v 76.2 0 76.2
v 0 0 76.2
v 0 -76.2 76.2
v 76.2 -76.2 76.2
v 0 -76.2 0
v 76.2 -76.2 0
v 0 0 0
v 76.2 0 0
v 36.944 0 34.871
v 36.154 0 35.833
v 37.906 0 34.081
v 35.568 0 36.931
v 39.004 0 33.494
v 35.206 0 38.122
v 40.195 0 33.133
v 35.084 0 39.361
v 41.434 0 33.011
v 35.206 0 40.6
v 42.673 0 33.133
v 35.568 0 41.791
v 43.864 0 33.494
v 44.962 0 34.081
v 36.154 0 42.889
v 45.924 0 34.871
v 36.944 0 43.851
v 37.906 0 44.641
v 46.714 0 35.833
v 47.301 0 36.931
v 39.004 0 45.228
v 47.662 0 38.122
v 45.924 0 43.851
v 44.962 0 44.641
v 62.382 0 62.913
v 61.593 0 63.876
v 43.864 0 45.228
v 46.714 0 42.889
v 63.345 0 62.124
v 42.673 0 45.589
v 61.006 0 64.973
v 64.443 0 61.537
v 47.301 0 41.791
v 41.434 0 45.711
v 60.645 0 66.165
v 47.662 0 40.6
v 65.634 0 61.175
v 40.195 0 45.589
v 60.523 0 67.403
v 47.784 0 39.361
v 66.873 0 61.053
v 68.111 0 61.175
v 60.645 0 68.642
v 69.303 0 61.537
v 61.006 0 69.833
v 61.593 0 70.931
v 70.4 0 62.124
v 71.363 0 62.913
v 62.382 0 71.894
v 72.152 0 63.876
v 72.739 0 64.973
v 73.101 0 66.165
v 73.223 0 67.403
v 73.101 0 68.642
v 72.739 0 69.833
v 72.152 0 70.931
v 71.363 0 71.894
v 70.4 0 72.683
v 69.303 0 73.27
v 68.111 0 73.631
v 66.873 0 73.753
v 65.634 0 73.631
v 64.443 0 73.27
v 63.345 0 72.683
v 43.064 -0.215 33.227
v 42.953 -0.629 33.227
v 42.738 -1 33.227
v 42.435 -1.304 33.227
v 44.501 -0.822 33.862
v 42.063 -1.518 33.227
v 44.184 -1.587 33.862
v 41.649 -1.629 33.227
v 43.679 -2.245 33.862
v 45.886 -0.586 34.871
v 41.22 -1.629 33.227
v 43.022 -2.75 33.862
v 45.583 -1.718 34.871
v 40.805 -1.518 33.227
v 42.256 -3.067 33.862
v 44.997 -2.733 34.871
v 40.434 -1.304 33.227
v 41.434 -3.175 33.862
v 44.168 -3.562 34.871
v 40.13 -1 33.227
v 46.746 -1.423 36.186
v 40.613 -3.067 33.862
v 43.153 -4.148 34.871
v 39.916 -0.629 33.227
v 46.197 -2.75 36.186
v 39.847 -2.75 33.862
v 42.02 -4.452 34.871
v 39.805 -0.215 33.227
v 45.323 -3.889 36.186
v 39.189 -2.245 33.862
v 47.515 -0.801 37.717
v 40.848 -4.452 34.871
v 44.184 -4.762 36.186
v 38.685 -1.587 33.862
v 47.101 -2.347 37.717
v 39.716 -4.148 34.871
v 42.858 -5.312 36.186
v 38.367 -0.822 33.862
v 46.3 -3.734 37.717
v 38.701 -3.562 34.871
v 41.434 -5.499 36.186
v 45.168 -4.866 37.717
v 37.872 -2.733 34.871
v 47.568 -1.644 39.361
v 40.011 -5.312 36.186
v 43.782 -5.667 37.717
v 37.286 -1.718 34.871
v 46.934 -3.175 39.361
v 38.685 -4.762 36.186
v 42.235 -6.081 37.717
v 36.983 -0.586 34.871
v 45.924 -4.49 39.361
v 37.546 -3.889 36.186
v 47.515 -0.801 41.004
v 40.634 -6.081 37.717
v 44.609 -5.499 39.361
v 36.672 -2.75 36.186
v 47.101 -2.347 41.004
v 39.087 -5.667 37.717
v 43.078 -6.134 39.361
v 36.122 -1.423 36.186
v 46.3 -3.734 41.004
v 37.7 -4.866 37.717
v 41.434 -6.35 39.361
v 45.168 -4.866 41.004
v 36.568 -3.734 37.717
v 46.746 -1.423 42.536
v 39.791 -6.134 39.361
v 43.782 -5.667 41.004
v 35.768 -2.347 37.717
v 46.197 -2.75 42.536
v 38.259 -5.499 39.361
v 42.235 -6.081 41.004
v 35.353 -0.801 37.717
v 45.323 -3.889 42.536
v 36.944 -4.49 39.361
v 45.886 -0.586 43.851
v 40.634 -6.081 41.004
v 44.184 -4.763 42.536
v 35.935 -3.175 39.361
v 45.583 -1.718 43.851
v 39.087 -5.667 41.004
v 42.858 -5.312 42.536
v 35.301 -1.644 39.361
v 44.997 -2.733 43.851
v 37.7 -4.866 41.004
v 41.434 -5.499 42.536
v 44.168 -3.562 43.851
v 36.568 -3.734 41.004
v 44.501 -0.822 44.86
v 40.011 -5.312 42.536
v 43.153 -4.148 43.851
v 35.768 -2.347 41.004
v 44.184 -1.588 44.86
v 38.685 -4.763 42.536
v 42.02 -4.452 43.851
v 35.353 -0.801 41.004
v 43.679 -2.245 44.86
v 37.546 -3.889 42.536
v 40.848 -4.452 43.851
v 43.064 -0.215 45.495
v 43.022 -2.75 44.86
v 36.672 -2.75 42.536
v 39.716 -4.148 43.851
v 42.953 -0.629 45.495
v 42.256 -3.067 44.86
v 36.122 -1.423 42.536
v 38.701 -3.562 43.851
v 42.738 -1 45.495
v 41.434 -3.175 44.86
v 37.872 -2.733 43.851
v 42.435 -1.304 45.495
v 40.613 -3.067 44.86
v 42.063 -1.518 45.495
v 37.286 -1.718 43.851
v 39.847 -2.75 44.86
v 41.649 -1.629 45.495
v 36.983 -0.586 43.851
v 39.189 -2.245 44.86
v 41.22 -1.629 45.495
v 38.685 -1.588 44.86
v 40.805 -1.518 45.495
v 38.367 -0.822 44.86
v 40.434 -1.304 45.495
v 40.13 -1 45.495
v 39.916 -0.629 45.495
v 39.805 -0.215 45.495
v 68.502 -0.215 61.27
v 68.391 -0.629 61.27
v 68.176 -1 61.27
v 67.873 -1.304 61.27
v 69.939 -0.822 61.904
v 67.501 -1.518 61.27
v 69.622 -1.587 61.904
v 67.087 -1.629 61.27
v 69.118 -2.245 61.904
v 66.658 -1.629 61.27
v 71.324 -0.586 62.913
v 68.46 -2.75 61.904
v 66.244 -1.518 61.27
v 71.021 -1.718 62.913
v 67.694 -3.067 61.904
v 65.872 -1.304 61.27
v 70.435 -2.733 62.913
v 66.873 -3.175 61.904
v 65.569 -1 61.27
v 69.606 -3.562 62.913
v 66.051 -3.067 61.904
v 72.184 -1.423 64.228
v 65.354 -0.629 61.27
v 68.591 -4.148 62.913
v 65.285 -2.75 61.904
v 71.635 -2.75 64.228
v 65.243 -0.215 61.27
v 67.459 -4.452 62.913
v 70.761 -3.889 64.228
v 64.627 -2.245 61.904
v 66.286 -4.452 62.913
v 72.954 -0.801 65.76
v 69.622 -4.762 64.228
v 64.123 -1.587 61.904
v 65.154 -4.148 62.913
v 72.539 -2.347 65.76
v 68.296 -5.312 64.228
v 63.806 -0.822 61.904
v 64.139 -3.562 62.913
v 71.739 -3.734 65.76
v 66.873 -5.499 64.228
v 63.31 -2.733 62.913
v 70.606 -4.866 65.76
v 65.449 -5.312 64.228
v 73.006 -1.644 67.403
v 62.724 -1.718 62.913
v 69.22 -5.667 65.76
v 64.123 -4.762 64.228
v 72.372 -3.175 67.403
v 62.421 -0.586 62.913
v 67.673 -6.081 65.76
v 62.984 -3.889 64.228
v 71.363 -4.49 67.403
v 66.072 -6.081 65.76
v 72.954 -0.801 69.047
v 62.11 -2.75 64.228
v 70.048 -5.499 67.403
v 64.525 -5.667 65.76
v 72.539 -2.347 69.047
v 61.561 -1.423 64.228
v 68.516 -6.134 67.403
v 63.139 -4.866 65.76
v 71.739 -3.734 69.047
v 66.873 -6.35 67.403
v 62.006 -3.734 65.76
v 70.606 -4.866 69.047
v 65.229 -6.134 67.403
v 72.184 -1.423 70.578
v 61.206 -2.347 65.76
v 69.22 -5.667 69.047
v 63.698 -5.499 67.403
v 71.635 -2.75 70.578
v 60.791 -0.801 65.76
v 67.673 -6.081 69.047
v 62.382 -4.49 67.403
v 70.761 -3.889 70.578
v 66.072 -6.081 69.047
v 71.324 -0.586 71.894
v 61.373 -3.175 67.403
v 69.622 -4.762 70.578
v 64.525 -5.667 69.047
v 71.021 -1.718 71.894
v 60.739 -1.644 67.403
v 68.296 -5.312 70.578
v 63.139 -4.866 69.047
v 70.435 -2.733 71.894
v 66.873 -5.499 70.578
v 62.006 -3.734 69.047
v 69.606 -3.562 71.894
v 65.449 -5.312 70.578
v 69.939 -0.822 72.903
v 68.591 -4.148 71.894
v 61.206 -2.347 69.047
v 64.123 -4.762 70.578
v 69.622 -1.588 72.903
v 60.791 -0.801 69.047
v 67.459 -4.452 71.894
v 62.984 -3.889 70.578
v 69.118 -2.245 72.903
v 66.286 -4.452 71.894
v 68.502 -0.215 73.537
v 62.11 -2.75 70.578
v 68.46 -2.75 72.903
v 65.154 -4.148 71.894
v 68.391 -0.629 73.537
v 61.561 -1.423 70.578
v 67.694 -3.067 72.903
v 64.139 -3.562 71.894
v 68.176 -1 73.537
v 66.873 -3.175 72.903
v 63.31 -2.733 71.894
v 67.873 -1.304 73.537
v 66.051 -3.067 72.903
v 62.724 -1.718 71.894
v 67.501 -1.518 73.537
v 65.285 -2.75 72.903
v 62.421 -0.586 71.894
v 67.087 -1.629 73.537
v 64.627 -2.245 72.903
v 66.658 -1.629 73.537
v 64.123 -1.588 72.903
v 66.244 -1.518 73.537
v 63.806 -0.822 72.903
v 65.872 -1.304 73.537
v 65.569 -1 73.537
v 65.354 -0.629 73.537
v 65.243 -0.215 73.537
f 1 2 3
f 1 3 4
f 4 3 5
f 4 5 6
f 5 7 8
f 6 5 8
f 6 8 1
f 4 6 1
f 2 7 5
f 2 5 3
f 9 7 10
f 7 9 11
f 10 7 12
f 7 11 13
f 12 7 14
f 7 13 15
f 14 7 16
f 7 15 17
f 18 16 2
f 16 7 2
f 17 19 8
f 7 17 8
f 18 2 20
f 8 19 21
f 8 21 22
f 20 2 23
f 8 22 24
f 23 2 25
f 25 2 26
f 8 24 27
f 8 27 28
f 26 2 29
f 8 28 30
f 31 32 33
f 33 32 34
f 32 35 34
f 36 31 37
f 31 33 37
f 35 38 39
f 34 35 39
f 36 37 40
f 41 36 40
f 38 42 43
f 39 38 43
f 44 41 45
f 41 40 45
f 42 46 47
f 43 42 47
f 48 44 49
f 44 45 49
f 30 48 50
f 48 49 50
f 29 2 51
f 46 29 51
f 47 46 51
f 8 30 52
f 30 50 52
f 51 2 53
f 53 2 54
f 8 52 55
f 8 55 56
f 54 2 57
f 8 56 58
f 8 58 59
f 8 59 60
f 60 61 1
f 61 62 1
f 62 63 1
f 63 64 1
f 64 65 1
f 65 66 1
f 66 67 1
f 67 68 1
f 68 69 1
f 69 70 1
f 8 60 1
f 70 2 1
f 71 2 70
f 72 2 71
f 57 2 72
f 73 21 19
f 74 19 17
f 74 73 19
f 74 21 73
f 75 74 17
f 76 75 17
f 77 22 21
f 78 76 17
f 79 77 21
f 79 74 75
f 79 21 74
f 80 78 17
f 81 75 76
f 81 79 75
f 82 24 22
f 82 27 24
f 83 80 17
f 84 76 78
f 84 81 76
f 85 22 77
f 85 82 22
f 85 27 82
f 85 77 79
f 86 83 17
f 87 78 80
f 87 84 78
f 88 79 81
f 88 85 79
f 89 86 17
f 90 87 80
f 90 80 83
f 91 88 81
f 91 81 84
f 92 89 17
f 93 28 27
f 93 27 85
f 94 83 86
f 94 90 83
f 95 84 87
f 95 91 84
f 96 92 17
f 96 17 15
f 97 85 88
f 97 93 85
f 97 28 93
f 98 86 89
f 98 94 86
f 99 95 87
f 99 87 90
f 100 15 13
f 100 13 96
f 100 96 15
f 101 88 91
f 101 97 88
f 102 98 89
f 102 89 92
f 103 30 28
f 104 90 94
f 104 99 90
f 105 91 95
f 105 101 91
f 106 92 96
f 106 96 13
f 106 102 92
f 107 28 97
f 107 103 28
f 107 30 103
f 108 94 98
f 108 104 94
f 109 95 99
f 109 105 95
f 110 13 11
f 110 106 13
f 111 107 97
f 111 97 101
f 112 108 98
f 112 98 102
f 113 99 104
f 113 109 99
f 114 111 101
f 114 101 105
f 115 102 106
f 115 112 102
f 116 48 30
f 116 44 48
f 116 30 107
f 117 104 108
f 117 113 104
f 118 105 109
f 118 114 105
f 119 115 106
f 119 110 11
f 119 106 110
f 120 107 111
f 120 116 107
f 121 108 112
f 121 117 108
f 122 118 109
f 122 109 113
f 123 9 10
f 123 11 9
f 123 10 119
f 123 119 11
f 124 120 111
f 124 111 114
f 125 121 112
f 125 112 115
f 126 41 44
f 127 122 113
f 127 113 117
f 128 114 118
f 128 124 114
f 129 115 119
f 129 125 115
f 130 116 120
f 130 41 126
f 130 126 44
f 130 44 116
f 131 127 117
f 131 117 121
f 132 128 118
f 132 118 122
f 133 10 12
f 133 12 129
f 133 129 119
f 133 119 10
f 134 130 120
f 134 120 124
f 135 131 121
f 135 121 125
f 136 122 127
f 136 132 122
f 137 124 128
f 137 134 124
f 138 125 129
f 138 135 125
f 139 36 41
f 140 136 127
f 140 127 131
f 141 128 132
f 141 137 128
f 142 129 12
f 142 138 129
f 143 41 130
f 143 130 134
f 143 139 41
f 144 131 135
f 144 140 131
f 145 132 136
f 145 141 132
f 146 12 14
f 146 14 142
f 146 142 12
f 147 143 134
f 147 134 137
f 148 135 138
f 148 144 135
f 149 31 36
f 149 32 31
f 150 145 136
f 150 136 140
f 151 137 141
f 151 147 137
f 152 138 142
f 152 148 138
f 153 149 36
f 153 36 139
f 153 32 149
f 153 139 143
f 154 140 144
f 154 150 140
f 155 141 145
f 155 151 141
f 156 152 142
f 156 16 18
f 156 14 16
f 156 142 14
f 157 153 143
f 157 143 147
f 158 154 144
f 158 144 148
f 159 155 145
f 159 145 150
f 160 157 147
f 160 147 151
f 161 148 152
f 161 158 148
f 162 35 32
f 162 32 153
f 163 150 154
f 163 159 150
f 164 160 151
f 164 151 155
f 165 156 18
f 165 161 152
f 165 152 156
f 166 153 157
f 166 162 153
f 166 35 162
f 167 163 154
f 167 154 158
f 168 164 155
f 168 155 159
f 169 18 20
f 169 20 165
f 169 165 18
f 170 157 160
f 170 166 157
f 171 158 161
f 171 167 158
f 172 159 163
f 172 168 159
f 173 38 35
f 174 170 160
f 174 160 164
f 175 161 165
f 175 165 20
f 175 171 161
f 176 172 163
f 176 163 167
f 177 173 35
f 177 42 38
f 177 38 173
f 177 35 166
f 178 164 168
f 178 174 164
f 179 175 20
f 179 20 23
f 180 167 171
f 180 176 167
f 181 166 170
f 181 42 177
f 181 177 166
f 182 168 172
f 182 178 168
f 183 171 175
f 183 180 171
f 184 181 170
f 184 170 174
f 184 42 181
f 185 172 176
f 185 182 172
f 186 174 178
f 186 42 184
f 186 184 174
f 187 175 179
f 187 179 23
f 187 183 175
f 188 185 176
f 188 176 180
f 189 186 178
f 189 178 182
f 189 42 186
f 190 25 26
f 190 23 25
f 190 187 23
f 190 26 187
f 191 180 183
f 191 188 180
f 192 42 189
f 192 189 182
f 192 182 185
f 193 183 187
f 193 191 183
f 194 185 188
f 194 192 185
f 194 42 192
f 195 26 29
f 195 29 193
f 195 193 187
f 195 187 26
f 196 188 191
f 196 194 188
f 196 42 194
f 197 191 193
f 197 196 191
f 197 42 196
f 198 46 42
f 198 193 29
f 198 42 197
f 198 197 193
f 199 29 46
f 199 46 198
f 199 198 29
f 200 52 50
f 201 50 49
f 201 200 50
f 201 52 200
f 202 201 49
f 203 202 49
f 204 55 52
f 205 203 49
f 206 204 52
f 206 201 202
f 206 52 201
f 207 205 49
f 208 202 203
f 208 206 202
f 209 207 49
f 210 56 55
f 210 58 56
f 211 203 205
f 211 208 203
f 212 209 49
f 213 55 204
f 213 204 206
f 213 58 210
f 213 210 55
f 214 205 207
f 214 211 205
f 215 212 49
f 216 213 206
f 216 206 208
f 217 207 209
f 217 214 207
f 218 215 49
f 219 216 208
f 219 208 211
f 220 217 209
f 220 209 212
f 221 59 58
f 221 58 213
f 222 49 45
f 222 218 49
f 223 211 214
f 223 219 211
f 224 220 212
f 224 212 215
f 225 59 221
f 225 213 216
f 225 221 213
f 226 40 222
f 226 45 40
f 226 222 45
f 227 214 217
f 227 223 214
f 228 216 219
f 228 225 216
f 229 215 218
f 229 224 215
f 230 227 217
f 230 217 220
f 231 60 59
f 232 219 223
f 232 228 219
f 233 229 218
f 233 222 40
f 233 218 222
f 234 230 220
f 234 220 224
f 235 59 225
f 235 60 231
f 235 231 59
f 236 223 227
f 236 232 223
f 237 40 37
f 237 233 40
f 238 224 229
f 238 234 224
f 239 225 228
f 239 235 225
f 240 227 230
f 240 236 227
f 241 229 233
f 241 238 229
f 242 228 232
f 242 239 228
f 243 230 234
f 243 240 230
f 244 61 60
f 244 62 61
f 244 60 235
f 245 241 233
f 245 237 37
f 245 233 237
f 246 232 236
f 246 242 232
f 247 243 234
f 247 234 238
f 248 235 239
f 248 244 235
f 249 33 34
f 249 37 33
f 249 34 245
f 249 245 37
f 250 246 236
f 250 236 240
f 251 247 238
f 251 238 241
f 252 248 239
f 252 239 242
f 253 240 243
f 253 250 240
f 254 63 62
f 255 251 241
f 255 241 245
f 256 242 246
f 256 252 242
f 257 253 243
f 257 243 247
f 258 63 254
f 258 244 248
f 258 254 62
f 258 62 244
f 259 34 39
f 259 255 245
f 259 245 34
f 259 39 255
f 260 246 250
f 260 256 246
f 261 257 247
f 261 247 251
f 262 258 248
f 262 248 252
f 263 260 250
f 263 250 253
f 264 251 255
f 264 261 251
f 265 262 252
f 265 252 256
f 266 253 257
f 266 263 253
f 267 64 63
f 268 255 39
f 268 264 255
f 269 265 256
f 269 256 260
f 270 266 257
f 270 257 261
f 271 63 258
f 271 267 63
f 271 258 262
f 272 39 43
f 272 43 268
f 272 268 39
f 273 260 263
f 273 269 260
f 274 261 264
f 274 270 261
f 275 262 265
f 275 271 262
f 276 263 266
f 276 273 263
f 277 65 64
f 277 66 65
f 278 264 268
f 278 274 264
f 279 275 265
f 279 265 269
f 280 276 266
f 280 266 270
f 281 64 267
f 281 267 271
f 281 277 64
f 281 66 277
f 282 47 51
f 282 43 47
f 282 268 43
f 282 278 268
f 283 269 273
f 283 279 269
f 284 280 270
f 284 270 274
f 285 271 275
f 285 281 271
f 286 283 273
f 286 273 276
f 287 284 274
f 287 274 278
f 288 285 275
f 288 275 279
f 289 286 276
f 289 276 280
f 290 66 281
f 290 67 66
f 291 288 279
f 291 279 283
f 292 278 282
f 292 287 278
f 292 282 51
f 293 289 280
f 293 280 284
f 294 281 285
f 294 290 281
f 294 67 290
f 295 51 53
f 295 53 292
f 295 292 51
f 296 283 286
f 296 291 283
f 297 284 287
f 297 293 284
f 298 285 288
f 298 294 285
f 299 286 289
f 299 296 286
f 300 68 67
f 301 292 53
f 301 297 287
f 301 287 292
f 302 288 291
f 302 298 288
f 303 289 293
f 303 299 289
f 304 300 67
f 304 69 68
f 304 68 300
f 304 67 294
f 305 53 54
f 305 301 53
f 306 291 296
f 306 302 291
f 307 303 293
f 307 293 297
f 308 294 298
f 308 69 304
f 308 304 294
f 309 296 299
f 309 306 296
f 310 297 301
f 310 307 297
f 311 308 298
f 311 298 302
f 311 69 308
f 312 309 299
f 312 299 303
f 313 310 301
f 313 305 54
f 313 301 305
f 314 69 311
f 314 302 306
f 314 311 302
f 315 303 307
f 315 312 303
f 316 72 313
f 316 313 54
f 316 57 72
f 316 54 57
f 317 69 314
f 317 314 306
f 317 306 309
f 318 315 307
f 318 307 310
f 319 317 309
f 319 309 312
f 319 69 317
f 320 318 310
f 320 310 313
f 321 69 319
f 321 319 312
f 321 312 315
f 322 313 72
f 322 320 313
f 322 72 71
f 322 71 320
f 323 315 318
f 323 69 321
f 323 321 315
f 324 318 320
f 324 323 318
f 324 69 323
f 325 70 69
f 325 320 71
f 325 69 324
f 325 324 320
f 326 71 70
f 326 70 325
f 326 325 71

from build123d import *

# Parameters (mm, degrees)
F0_W     = 76.2
F0_H     = 76.2
F1_DEPTH = 76.2


with BuildPart() as f1:
    # F0 (on Front) → F1 (new body)
    with BuildSketch(Plane.XZ):
        with Locations((38.1, 38.1)):
            Rectangle(F0_W, F0_H)
    extrude(amount=F1_DEPTH)

    # F2 (on face) → F3 (revolve, cut)
    with BuildSketch(Plane.XZ):
        with BuildLine():
            Line((66.872552, 73.753443), (66.872552, 61.053443))
            ThreePointArc((66.872552, 61.053443), (73.222552, 67.403443), (66.872552, 73.753443))
        make_face()
    revolve(axis=Axis((66.872552, 0, 38.640488), (0, 0, -1)), mode=Mode.SUBTRACT)

    # F4 (on face) → F5 (revolve, cut)
    with BuildSketch(Plane.XZ):
        with BuildLine():
            Line((41.434311, 45.710968), (41.434311, 33.010968))
            ThreePointArc((41.434311, 33.010968), (47.784311, 39.360968), (41.434311, 45.710968))
        make_face()
    revolve(axis=Axis((41.434311, 0, 37.213955), (0, 0, -1)), mode=Mode.SUBTRACT)


solid = f1.part
